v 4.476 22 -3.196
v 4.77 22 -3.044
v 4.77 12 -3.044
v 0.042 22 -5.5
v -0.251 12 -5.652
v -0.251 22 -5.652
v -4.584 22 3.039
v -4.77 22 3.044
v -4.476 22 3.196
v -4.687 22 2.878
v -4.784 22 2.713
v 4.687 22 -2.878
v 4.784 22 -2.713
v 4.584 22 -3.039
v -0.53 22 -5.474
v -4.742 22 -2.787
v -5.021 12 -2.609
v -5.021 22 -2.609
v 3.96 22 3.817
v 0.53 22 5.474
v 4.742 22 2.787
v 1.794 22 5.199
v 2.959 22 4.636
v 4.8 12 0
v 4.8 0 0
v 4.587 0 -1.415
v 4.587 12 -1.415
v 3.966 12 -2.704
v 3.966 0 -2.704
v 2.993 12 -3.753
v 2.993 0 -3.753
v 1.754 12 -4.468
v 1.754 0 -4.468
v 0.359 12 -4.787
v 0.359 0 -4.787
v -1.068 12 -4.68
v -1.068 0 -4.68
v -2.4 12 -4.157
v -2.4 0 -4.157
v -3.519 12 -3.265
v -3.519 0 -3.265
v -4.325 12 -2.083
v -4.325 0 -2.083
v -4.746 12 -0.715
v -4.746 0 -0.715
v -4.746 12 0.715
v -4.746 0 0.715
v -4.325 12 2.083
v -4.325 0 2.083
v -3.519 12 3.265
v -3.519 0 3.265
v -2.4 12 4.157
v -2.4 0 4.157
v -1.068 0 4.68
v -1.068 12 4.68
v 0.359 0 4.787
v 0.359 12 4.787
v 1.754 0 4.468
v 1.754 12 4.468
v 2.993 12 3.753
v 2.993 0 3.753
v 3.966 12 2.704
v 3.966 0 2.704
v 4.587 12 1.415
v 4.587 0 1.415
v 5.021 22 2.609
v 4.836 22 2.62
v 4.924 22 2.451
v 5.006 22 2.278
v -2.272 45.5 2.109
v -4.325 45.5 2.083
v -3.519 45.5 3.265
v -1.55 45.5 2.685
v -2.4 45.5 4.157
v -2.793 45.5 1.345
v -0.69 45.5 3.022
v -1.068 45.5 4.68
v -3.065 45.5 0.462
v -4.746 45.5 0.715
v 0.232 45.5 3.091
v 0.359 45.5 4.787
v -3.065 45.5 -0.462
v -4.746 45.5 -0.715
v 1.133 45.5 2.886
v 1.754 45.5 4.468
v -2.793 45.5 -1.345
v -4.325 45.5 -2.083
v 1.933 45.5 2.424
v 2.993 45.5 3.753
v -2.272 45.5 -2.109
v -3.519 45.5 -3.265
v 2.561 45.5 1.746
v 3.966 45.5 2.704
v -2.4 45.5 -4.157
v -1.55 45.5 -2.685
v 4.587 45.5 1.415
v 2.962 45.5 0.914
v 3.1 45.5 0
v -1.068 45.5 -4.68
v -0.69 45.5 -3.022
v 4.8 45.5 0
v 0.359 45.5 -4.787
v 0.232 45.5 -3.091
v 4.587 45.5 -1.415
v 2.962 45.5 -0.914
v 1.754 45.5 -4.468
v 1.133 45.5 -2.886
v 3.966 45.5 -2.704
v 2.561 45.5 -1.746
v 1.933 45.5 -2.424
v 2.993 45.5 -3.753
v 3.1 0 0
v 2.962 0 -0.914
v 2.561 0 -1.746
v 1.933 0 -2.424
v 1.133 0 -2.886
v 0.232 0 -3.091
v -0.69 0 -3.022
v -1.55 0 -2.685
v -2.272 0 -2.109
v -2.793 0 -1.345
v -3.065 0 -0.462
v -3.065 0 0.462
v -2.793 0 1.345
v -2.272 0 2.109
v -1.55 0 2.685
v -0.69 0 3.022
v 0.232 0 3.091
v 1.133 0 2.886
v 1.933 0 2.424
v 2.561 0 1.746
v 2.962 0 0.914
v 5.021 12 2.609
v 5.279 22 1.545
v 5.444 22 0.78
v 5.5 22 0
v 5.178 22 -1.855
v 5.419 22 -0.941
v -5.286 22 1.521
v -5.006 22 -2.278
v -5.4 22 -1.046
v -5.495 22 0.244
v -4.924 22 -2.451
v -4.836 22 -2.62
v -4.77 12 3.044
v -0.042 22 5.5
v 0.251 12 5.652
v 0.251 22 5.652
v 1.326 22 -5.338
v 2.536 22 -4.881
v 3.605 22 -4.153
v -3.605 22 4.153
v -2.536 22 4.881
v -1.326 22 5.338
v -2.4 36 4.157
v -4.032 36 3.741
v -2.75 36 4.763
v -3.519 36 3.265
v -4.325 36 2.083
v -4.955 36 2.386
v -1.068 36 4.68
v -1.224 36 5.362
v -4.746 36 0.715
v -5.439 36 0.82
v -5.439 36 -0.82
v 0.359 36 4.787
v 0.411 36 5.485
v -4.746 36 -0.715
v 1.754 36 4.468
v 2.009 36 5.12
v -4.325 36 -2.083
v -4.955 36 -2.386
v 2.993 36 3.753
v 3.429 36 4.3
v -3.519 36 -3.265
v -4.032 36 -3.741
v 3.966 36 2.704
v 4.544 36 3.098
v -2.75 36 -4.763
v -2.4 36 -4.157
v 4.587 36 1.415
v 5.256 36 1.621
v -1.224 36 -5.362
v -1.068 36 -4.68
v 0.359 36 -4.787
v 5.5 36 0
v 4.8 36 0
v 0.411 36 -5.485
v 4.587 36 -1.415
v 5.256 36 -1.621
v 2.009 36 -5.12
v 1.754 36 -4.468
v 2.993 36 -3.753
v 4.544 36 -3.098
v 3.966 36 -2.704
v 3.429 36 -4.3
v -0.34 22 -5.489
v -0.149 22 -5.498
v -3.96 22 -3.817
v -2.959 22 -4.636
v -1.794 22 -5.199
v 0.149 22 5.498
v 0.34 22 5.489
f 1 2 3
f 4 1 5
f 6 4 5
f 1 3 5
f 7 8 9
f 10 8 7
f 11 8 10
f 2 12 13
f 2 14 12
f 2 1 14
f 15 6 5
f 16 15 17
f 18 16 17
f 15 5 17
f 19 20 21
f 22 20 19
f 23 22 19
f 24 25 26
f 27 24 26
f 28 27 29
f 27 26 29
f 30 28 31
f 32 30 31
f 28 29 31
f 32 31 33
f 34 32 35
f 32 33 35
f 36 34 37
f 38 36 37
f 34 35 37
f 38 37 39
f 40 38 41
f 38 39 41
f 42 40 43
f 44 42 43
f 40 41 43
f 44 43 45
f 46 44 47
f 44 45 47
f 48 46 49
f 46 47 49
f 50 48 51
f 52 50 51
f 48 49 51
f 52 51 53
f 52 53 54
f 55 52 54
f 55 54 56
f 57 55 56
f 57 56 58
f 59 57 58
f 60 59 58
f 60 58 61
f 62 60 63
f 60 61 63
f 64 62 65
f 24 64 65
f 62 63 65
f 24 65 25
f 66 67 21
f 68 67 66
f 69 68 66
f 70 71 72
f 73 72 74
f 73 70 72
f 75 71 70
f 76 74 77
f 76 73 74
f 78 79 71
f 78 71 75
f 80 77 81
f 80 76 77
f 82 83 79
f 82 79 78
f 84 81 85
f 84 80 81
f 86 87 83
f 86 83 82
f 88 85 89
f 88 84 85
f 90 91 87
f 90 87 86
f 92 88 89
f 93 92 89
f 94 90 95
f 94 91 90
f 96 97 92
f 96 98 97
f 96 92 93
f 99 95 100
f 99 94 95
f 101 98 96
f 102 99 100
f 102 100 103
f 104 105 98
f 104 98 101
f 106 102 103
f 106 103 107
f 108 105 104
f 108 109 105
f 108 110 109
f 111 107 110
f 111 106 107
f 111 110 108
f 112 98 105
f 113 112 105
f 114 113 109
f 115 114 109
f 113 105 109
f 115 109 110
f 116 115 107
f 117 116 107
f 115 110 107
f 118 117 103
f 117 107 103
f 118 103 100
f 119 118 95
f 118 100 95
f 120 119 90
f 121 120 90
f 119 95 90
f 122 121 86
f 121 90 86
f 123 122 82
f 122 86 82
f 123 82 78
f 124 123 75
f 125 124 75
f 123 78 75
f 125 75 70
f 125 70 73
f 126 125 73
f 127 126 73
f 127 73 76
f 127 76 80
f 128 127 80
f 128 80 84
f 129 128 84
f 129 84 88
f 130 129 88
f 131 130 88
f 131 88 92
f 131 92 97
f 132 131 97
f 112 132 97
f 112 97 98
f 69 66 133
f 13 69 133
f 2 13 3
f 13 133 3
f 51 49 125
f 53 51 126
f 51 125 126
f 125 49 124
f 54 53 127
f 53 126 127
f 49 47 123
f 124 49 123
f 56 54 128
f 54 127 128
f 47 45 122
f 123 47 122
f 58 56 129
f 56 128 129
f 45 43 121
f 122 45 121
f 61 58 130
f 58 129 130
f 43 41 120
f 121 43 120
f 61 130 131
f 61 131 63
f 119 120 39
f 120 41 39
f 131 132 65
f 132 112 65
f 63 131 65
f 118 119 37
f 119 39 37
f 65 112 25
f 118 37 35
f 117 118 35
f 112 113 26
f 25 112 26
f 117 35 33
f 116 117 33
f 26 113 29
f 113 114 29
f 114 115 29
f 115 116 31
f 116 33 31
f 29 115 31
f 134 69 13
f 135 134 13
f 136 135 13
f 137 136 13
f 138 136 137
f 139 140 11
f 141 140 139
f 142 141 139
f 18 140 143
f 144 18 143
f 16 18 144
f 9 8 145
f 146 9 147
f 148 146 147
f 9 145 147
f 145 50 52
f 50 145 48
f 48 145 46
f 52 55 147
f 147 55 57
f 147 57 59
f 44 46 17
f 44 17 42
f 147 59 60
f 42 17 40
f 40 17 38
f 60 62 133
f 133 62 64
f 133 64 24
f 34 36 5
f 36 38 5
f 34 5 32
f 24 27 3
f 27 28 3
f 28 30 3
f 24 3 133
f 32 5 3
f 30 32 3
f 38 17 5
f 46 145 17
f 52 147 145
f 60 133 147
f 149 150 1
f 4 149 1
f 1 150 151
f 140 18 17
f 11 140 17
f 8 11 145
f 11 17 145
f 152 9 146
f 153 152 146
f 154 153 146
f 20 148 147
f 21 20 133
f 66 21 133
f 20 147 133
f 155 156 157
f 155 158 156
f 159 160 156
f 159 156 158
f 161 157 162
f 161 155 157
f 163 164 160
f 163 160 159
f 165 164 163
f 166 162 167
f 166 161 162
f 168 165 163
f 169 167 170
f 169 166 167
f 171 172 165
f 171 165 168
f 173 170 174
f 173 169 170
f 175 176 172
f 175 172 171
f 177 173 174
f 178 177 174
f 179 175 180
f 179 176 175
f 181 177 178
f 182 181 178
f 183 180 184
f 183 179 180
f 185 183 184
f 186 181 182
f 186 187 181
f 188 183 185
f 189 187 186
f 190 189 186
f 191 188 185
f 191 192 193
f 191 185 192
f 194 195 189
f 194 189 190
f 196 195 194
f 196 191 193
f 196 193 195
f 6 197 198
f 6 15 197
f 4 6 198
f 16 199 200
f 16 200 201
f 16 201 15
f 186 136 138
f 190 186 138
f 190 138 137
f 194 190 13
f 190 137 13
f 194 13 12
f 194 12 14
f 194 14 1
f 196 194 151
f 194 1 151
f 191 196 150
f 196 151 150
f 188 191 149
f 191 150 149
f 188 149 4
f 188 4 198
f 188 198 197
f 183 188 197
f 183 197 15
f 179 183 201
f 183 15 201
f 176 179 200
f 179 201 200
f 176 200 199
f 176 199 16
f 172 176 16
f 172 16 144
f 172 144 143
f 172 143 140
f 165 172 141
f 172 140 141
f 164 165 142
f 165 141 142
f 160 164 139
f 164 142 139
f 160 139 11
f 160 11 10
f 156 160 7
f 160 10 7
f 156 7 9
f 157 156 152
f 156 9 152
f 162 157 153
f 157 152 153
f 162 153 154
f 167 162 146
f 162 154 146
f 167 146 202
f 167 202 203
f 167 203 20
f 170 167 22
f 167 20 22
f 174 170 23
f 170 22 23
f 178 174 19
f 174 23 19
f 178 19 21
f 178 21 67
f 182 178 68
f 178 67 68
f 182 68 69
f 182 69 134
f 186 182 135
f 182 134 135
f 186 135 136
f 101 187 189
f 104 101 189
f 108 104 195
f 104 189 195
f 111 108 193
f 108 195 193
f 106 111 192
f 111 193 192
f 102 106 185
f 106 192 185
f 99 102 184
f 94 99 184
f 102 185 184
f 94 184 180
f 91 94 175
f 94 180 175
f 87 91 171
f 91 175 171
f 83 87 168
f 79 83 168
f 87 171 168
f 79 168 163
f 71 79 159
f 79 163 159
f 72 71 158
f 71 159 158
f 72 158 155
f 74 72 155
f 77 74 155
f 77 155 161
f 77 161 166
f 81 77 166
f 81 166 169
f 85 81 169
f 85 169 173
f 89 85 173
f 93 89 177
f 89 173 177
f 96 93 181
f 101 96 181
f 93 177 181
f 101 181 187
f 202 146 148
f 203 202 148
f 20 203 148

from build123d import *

# Parameters (mm, degrees)
SKETCH_2_R          = 4.8
EXTRUDE_1_DEPTH     = 12
EXTRUDE_2_DEPTH     = 10
SKETCH_4_R          = 5.5
EXTRUDE_3_DEPTH     = 14
SKETCH_5_R          = 4.8
EXTRUDE_4_DEPTH     = 9.5
SKETCH_6_R          = 3.1
CUT_EXTRUDE_1_DEPTH = 46.5


with BuildPart() as part:
    # Эскиз2 → Бобышка-Вытянуть1 (new body)
    with BuildSketch(Plane(origin=(0, 0, 0), x_dir=(1, 0, 0), z_dir=(0, 1, 0))):
        Circle(SKETCH_2_R)
    extrude(amount=EXTRUDE_1_DEPTH)

    # Эскиз3 → Бобышка-Вытянуть2 (add)
    with BuildSketch(Plane(origin=(0, 12, 0), x_dir=(1, 0, 0), z_dir=(0, 1, 0))):
        Polygon((5.0208225, -2.608577151), (4.769505331, 3.043871258), (-0.251317169, 5.652448409), (-5.0208225, 2.608577151), (-4.769505331, -3.043871258), (0.251317169, -5.652448409), align=None)
    extrude(amount=EXTRUDE_2_DEPTH)

    # Эскиз4 → Бобышка-Вытянуть3 (add)
    with BuildSketch(Plane(origin=(0, 22, 0), x_dir=(1, 0, 0), z_dir=(0, 1, 0))):
        Circle(SKETCH_4_R)
    extrude(amount=EXTRUDE_3_DEPTH)

    # Эскиз5 → Бобышка-Вытянуть4 (add)
    with BuildSketch(Plane(origin=(0, 36, 0), x_dir=(1, 0, 0), z_dir=(0, 1, 0))):
        Circle(SKETCH_5_R)
    extrude(amount=EXTRUDE_4_DEPTH)

    # Эскиз6 → Вырез-Вытянуть1 (cut, through all)
    with BuildSketch(Plane(origin=(0, 45.5, 0), x_dir=(1, 0, 0), z_dir=(0, 1, 0))):
        Circle(SKETCH_6_R)
    extrude(amount=-CUT_EXTRUDE_1_DEPTH, mode=Mode.SUBTRACT)


solid = part.part
